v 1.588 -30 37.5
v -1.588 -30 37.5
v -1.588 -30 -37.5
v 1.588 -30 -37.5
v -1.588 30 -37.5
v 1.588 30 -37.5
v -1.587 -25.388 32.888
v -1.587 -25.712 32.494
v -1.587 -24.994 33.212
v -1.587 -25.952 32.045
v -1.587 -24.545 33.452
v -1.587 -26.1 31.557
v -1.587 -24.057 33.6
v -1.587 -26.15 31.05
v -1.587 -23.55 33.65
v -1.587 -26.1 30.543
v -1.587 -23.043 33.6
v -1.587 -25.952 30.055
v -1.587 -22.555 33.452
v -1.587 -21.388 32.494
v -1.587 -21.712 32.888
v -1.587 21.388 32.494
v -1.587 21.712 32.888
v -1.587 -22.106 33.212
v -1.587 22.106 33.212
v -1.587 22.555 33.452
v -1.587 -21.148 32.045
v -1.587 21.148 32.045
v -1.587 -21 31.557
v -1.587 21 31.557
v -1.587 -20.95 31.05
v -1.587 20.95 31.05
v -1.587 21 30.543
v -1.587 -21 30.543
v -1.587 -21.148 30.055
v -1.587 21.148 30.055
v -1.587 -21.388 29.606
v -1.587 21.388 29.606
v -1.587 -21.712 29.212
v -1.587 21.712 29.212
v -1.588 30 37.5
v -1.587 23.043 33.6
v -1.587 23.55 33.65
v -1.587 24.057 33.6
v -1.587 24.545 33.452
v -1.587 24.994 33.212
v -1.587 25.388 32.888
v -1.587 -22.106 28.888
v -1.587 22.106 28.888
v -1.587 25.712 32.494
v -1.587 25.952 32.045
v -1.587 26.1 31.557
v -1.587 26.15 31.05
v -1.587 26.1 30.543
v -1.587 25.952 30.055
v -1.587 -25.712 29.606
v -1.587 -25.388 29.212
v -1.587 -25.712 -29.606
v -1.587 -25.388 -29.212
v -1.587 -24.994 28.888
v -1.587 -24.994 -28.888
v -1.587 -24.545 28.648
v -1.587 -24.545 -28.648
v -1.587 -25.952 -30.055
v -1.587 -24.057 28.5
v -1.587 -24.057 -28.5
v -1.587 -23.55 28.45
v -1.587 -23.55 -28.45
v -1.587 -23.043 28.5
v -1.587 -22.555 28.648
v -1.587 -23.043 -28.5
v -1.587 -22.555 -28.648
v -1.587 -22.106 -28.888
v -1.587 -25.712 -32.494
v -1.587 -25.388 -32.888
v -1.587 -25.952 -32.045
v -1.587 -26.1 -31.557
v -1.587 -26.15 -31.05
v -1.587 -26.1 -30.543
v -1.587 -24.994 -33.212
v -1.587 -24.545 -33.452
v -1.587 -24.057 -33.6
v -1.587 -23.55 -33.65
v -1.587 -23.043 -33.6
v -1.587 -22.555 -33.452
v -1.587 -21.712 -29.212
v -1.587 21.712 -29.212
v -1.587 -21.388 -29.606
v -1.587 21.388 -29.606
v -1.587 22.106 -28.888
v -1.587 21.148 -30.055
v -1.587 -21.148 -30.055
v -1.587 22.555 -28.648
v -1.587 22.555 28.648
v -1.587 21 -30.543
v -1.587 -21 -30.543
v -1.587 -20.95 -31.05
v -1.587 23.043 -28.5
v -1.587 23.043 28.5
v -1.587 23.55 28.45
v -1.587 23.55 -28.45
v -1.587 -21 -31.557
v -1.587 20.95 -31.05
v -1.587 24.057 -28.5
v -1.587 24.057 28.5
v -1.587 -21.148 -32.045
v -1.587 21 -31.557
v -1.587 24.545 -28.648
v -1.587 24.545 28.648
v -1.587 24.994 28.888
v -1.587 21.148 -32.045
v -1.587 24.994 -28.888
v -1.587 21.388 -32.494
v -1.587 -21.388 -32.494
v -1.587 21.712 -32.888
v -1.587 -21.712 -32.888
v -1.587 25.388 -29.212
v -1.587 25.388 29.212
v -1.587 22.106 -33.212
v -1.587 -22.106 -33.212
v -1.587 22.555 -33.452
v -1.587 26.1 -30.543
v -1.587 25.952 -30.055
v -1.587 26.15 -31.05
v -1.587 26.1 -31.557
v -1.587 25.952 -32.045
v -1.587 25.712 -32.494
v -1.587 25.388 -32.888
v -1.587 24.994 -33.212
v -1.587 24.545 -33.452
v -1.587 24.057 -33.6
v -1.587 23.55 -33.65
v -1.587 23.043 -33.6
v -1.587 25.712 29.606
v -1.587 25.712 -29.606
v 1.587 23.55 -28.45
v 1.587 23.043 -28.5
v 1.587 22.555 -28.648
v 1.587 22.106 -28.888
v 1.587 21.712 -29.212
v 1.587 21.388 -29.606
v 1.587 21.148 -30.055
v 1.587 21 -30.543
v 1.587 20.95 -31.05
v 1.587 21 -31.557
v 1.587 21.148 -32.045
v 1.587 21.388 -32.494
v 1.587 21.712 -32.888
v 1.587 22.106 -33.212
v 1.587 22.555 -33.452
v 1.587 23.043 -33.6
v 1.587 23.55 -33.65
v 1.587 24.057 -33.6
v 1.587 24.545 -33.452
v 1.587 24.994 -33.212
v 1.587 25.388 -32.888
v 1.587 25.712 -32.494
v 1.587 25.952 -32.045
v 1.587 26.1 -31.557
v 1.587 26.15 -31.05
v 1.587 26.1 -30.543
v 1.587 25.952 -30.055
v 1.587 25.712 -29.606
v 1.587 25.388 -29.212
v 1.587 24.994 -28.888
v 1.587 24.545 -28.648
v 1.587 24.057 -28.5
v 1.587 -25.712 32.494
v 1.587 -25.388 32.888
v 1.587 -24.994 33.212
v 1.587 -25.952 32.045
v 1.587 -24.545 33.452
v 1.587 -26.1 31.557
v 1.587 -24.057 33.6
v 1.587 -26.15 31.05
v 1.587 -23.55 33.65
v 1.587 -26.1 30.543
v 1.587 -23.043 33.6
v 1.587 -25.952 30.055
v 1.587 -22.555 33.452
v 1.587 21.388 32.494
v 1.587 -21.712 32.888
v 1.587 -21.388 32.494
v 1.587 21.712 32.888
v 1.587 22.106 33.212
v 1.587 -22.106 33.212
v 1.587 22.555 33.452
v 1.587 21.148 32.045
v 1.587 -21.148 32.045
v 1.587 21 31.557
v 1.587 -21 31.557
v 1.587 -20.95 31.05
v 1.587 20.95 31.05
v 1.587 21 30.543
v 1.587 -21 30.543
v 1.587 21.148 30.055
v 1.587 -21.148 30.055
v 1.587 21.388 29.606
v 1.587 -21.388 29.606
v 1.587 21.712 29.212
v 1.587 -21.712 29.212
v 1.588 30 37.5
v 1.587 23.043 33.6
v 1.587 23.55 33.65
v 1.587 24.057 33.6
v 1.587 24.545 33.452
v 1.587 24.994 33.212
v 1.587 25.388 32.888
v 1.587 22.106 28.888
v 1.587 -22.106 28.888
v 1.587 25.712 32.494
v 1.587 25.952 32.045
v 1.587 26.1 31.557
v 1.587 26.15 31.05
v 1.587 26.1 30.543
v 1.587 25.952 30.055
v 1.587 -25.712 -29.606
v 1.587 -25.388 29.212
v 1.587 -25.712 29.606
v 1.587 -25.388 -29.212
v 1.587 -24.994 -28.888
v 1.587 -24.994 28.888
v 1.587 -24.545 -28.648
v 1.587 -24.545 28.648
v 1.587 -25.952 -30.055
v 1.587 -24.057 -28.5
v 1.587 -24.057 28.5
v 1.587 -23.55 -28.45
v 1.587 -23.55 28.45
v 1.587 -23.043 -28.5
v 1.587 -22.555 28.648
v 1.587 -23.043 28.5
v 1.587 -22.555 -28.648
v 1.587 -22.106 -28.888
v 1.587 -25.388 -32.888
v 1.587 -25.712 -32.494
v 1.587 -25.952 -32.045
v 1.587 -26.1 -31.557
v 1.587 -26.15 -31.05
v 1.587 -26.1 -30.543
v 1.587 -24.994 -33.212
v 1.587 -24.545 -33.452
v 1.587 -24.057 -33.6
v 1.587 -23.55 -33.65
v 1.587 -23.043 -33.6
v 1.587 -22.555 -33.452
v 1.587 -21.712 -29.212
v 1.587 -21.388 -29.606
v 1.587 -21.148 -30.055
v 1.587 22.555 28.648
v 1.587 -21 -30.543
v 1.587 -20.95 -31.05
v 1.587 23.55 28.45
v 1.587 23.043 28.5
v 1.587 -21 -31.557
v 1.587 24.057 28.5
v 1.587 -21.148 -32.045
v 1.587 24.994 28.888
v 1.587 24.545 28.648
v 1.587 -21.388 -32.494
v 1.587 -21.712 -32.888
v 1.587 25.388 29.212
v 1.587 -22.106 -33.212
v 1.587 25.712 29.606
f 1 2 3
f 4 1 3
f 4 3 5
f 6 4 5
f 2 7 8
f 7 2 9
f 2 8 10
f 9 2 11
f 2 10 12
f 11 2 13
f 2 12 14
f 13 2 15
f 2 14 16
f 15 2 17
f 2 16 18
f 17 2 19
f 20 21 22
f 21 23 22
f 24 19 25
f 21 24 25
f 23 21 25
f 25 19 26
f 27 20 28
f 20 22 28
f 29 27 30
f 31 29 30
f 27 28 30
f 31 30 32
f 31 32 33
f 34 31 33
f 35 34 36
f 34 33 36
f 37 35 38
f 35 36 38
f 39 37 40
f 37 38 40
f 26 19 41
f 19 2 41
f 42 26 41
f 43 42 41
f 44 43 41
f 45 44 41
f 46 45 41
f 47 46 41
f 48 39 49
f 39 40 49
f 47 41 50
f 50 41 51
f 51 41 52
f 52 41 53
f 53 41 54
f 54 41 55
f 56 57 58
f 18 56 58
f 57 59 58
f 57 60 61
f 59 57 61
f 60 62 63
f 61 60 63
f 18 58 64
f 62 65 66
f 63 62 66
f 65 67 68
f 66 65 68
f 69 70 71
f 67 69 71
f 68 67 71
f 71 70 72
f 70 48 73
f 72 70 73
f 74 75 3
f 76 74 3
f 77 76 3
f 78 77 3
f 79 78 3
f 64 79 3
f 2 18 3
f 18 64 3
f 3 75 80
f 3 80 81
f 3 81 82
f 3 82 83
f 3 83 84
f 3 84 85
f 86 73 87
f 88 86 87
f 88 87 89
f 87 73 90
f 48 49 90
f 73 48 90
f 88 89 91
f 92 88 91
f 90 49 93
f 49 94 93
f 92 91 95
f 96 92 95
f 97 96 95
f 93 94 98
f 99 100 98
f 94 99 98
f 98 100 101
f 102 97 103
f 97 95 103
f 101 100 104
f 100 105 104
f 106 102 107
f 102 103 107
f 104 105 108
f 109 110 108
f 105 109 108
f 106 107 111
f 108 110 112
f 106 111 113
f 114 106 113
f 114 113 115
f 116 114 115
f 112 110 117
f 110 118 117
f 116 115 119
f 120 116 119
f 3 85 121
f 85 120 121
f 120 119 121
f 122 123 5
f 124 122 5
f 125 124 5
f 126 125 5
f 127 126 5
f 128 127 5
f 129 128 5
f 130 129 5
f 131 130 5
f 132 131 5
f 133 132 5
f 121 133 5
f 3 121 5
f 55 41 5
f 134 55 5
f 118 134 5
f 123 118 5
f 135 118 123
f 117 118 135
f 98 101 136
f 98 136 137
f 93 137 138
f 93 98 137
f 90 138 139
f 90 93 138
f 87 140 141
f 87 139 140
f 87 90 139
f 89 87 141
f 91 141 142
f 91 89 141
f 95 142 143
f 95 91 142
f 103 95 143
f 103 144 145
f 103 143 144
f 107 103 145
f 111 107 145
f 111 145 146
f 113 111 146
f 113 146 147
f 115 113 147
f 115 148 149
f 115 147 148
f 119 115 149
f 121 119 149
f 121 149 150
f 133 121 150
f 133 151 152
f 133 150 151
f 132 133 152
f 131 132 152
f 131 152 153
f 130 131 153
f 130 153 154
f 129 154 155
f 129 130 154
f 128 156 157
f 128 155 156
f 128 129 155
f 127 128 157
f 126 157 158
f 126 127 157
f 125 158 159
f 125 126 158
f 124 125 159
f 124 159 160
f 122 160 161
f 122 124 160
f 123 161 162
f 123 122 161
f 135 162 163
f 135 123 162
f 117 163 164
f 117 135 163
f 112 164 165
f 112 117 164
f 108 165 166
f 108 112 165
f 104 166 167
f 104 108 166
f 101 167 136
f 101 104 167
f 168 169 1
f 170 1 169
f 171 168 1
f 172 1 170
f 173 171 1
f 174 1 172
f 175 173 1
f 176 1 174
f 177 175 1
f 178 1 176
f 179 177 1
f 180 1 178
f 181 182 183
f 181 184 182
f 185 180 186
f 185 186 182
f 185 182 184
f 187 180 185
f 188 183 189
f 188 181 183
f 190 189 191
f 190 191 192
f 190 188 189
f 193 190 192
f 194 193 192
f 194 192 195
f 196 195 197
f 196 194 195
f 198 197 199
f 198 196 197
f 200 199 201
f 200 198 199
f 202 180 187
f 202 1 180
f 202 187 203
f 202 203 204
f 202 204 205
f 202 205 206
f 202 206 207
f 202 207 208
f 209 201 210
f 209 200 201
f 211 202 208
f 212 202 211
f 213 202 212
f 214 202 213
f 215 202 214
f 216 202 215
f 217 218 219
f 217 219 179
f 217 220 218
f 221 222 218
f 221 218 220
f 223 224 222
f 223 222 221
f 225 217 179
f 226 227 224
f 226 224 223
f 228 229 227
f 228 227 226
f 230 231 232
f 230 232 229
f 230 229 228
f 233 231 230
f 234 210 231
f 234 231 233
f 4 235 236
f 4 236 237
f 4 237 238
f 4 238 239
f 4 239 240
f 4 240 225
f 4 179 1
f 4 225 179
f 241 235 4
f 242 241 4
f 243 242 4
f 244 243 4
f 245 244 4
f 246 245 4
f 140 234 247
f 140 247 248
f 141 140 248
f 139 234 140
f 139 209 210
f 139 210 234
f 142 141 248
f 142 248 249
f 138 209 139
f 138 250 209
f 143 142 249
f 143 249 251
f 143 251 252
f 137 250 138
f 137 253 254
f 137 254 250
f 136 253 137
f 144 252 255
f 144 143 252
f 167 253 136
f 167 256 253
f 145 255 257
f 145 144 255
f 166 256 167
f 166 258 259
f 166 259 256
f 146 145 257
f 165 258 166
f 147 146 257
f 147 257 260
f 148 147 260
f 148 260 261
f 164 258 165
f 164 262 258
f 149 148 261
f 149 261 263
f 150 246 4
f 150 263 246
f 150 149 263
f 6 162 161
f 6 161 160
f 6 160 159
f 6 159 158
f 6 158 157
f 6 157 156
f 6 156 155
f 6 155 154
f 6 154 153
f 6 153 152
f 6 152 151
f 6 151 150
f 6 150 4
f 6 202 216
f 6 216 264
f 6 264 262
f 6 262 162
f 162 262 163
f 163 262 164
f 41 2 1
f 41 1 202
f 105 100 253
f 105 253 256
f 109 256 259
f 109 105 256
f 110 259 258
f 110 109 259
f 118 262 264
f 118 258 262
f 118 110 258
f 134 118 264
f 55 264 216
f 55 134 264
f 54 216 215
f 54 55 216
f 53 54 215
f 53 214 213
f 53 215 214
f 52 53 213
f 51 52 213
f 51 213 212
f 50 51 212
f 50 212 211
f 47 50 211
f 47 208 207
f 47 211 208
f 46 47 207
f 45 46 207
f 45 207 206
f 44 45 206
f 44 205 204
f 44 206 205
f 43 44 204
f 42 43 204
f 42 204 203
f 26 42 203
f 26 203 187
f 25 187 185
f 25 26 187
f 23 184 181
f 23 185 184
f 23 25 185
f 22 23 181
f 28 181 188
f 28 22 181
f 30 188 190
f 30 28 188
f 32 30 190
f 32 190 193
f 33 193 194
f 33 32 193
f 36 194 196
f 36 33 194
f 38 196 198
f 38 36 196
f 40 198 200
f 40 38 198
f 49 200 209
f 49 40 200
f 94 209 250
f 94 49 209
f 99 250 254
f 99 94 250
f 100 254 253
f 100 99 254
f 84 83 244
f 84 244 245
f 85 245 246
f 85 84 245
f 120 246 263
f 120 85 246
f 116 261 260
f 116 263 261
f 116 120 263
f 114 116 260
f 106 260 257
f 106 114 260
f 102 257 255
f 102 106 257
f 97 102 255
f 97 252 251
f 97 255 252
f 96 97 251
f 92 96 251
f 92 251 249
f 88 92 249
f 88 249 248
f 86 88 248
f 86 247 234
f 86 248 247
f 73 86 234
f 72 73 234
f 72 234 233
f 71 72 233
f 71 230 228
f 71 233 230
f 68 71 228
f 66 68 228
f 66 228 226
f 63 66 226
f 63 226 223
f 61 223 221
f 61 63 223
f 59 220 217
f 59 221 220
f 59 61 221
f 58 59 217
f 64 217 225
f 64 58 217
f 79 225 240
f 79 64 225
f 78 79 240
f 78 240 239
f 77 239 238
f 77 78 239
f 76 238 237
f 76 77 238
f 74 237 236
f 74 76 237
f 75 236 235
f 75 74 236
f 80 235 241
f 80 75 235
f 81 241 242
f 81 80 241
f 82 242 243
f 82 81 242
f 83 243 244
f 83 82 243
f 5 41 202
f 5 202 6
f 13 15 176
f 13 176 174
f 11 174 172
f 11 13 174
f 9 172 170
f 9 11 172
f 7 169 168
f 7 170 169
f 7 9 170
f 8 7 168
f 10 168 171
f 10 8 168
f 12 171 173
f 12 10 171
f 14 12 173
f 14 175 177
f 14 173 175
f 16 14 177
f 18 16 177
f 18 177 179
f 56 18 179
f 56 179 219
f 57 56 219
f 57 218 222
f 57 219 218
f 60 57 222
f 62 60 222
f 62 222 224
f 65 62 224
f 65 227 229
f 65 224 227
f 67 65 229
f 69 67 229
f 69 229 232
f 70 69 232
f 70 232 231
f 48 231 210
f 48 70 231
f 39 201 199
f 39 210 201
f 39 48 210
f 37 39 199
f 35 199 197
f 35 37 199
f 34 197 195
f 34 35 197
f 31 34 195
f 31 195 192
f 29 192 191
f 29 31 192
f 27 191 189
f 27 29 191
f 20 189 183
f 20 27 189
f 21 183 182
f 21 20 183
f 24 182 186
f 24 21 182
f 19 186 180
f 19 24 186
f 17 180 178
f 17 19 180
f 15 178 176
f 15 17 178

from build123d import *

# Parameters (mm, degrees)
BOSS_EXTRUDE1_DEPTH      = 1.5875
BOSS_EXTRUDE1_DEPTH_BACK = 1.5875
SKETCH1_W                = 75
SKETCH1_H                = 60
CUT_EXTRUDE1_DEPTH       = 49.049663435
CUT_EXTRUDE1_DEPTH_BACK  = 49.049663435
SKETCH2_R                = 2.6


with BuildPart() as part:
    # Sketch1 → Boss-Extrude1 (new, two sides: drawn at the far end of the back side and taken through both)
    with BuildSketch(Plane(origin=(0, 0, 0), x_dir=(0, 0, -1), z_dir=(1, 0, 0)).offset(-BOSS_EXTRUDE1_DEPTH_BACK)):
        Rectangle(SKETCH1_W, SKETCH1_H)
    extrude(amount=BOSS_EXTRUDE1_DEPTH + BOSS_EXTRUDE1_DEPTH_BACK)

    # Sketch2 → Cut-Extrude1 (cut, two sides: drawn at the far end of the back side and taken through both)
    with BuildSketch(Plane(origin=(0, 0, 0), x_dir=(0, 0, -1), z_dir=(1, 0, 0)).offset(-CUT_EXTRUDE1_DEPTH_BACK)):
        with Locations((-31.05, 23.55)):
            Circle(SKETCH2_R)
        with Locations((31.05, 23.55)):
            Circle(SKETCH2_R)
        with Locations((31.05, -23.55)):
            Circle(SKETCH2_R)
        with Locations((-31.05, -23.55)):
            Circle(SKETCH2_R)
    extrude(amount=CUT_EXTRUDE1_DEPTH + CUT_EXTRUDE1_DEPTH_BACK, mode=Mode.SUBTRACT)


solid = part.part
